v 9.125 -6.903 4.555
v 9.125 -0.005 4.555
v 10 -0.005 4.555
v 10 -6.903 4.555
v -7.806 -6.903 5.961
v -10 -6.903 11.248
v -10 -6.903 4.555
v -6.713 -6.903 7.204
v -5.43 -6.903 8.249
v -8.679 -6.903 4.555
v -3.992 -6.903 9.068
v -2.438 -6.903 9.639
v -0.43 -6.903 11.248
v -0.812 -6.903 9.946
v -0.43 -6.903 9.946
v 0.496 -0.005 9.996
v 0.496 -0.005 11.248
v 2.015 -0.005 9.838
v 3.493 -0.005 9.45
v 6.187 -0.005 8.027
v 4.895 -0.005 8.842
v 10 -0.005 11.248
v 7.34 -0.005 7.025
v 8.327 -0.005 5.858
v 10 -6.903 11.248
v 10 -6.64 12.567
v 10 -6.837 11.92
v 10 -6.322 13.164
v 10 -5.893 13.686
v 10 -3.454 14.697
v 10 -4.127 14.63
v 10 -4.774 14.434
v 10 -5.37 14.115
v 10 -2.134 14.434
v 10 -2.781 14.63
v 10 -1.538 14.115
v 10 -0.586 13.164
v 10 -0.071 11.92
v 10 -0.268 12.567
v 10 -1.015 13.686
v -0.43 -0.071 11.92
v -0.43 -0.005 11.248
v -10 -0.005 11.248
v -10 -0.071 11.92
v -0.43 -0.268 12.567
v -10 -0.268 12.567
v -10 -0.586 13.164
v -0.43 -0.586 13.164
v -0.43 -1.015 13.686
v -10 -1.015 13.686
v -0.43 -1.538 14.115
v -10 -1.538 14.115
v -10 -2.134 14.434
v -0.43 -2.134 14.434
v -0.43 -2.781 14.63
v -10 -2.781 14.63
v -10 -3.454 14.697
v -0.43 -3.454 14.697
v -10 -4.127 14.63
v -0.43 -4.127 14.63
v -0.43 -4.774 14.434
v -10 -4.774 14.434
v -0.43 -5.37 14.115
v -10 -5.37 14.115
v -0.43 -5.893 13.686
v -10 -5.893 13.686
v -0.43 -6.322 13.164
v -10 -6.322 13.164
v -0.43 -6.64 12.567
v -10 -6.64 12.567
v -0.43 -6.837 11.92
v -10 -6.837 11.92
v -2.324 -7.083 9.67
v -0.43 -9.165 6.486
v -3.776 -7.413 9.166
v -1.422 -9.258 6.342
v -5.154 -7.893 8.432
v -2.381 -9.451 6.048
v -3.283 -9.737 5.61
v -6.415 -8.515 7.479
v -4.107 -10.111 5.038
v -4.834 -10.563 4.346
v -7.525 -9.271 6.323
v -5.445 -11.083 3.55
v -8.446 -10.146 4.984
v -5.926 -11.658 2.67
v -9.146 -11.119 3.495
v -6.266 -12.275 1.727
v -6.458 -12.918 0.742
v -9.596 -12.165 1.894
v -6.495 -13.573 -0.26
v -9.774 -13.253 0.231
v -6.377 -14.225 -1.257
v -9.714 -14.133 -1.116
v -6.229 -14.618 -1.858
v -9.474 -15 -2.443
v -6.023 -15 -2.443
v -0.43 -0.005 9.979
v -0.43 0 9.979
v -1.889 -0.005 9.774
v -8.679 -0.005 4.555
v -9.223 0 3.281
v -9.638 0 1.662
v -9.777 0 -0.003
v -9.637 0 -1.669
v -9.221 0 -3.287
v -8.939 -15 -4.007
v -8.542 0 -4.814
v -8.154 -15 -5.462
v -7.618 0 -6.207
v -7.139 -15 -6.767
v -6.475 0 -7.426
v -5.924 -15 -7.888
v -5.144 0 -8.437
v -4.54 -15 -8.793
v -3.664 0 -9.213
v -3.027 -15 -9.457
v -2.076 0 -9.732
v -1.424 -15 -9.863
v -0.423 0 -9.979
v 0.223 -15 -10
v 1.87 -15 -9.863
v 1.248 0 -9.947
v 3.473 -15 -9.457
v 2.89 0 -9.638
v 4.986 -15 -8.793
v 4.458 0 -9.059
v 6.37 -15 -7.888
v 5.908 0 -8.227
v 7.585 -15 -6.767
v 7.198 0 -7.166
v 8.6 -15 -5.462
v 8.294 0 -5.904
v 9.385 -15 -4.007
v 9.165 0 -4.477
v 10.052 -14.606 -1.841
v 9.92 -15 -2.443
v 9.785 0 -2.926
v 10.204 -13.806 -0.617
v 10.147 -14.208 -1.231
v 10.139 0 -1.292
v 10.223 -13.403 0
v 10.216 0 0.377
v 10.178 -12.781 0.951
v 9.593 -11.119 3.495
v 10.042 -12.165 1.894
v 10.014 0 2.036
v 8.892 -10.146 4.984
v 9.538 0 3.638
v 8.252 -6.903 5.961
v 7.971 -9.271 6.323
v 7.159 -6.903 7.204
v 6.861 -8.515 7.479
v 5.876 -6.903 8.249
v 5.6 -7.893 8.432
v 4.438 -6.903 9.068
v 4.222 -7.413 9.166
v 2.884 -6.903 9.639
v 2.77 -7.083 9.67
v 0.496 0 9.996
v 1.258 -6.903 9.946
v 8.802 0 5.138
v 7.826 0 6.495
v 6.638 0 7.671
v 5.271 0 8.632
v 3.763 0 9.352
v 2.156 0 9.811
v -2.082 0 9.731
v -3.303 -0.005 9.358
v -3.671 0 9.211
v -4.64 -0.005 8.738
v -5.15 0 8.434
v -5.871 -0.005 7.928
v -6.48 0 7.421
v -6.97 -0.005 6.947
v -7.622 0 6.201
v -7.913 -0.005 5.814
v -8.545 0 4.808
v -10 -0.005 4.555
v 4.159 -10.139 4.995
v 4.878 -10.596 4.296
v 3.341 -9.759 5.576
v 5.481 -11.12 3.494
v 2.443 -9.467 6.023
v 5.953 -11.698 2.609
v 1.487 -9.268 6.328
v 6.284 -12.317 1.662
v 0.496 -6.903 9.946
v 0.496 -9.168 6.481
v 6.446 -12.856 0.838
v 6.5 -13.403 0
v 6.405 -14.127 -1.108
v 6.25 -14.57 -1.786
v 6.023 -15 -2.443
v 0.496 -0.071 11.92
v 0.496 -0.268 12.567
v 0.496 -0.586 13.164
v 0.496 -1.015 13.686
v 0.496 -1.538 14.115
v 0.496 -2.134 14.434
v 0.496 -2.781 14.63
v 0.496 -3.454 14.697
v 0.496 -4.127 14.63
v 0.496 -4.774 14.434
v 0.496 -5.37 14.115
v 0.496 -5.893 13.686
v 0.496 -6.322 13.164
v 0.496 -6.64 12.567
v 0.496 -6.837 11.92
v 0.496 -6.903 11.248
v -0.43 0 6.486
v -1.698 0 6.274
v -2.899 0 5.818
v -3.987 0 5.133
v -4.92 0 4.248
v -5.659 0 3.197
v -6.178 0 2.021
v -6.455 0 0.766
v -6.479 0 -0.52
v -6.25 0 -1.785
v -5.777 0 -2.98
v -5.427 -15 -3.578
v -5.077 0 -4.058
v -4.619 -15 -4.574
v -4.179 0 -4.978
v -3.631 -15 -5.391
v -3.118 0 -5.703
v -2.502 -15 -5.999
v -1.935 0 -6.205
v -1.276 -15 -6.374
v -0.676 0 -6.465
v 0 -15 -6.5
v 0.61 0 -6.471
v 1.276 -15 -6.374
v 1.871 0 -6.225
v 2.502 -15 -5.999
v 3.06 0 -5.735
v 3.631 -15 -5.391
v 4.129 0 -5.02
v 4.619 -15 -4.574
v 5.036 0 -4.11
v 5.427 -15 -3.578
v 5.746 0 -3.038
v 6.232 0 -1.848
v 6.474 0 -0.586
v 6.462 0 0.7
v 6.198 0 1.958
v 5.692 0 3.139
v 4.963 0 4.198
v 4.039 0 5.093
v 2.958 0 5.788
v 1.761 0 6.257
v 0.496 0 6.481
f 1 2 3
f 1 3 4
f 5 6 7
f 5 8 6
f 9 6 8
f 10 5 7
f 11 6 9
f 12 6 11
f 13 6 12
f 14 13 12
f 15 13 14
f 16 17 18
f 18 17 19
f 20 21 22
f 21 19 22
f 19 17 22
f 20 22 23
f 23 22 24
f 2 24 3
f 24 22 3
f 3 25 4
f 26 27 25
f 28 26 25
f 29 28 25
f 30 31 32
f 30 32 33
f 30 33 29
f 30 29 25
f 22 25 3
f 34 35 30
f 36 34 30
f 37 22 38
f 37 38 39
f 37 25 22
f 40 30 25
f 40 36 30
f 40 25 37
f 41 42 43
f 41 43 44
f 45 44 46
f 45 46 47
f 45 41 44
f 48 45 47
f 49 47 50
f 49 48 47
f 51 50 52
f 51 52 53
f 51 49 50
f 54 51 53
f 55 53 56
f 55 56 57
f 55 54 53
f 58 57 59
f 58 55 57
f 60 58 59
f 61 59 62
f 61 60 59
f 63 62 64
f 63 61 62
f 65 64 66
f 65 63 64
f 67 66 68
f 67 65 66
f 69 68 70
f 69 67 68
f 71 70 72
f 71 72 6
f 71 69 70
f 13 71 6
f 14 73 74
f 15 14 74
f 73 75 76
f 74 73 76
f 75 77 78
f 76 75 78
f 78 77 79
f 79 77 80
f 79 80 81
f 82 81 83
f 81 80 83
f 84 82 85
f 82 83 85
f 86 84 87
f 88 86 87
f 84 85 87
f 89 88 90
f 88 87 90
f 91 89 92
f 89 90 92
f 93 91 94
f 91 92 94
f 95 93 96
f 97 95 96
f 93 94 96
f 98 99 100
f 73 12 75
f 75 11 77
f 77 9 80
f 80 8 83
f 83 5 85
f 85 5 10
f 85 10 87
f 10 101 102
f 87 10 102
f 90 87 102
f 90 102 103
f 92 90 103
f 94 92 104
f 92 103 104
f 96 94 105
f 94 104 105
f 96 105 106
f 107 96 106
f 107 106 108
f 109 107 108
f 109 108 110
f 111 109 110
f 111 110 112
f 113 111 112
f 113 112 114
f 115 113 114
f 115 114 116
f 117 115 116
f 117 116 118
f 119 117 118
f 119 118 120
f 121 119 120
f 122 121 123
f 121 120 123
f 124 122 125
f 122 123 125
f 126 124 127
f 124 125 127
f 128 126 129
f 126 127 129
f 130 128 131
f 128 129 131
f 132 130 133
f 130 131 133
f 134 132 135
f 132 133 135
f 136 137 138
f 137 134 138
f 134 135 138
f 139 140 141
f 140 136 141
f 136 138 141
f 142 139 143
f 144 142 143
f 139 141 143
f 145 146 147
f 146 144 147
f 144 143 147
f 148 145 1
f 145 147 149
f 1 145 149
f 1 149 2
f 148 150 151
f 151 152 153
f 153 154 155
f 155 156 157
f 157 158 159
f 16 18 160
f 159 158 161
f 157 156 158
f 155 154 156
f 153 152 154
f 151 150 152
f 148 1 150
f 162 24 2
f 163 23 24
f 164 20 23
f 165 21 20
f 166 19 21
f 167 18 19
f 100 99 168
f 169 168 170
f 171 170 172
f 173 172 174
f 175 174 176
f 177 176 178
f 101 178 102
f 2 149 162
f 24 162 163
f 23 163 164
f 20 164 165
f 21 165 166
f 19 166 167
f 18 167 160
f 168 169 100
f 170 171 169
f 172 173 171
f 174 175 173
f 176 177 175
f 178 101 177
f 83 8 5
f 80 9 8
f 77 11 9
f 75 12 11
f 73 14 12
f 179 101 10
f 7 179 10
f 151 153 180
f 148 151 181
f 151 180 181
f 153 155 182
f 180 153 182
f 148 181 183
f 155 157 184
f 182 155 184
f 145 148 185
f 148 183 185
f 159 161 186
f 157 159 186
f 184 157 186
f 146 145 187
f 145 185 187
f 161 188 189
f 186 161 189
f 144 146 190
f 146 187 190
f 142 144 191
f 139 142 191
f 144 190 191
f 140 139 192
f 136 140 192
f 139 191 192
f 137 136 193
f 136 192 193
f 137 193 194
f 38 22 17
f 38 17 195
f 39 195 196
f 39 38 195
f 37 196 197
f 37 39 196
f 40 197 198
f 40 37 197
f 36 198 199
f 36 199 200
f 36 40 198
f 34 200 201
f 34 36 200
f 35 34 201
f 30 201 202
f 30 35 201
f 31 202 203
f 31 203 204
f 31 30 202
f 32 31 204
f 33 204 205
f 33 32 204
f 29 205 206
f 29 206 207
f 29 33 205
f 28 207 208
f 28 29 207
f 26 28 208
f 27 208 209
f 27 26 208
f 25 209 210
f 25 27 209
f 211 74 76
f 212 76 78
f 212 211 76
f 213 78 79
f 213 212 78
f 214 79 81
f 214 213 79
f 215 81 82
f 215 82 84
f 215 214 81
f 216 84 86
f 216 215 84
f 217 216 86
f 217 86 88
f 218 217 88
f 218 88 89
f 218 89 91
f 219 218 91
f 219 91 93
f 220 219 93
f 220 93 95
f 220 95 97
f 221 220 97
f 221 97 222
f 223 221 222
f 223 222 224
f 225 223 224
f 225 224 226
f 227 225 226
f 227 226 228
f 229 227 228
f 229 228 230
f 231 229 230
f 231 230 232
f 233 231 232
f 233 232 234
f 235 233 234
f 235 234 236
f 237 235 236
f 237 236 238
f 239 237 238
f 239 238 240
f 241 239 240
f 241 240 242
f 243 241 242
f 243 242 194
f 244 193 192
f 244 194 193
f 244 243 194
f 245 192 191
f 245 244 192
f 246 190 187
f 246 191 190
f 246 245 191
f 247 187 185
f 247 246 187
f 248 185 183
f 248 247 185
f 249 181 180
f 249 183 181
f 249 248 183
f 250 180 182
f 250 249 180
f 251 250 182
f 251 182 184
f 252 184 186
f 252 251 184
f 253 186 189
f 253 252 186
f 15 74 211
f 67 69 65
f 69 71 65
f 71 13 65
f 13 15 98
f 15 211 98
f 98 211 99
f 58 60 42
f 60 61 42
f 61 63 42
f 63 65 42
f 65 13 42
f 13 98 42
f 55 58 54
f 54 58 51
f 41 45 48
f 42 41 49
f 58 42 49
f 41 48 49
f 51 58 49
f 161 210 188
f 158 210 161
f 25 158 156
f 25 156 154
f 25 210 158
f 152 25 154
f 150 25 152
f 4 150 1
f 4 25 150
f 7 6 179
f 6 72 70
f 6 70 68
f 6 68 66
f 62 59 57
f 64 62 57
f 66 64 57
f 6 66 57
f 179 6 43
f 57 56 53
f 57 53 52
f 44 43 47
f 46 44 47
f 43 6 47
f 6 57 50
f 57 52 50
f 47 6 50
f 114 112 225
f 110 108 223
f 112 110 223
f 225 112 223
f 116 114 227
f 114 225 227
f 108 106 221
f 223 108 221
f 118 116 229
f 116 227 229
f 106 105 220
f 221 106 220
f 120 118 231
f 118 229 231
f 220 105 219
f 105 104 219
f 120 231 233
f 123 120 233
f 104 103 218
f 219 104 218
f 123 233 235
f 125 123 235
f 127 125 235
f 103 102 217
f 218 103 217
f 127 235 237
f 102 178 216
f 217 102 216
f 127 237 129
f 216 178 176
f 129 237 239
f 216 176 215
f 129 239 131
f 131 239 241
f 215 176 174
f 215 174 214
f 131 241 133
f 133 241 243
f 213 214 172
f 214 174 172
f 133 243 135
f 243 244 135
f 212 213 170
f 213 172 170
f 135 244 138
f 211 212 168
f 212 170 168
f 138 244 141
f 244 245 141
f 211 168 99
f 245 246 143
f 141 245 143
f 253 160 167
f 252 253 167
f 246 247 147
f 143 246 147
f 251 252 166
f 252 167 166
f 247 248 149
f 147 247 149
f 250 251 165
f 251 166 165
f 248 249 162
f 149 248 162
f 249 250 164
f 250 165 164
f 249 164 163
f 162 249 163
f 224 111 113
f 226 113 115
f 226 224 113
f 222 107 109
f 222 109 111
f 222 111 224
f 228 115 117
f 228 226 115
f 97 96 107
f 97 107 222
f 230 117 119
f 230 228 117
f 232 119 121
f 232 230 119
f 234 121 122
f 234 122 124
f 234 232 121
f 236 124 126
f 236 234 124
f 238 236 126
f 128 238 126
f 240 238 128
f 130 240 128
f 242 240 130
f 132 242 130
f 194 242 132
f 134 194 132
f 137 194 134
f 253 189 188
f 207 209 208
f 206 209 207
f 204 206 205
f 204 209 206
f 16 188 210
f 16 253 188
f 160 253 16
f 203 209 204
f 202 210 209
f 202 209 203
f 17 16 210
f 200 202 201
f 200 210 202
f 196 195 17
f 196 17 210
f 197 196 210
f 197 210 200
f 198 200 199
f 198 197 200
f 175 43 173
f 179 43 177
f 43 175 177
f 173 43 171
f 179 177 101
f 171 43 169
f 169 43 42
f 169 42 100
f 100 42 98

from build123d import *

# Parameters (mm, degrees)
SKETCH_R             = 10
SKETCH_R_2           = 6.5
PAD_DEPTH            = 15
POCKET_DEPTH         = 15
POCKET_DEPTH_BACK    = -15
PAD001_DEPTH         = 10
PAD001_DEPTH_BACK    = 10
SKETCH003_W          = 0.925108
SKETCH003_H          = 21.969815
POCKET001_DEPTH      = 15
POCKET001_DEPTH_BACK = -15
SKETCH004_R          = 6.5
POCKET002_DEPTH      = 15
POCKET002_DEPTH_BACK = -15


with BuildPart() as part:
    # Sketch (on XZ_Plane of Origin) → Pad (new body)
    with BuildSketch(Plane.XZ):
        with Locations((0.223041, 0)):
            Circle(SKETCH_R)
        Circle(SKETCH_R_2, mode=Mode.SUBTRACT)
    extrude(amount=PAD_DEPTH)

    # Sketch001 (on YZ_Plane of Origin) → Pocket (cut, two sides)
    with BuildSketch(Plane.YZ) as pocket_sk:
        Polygon((-5.152612, 12.624485), (-17.571489, -6.377891), (-30.254476, 15.01538), (-10.204725, 21.22482), align=None)
    extrude(amount=-POCKET_DEPTH, mode=Mode.SUBTRACT)
    extrude(pocket_sk.sketch, amount=-POCKET_DEPTH_BACK, mode=Mode.SUBTRACT)

    # Sketch002 (on YZ_Plane of Origin) → Pad001 (join, two sides)
    with BuildSketch(Plane.YZ) as pad001_sk:
        with BuildLine():
            ThreePointArc((-0.00519, 11.247658), (-3.454061, 14.696529), (-6.902933, 11.247658))
            Line((-6.902933, 11.247658), (-6.902933, 4.5552))
            Line((-0.00519, 4.5552), (-6.902933, 4.5552))
            Line((-0.00519, 11.247658), (-0.00519, 4.5552))
        make_face()
    extrude(amount=PAD001_DEPTH)
    extrude(pad001_sk.sketch, amount=-PAD001_DEPTH_BACK)

    # Sketch003 (on XZ_Plane of Origin) → Pocket001 (cut, two sides)
    with BuildSketch(Plane.XZ) as pocket001_sk:
        with Locations((0.033004, 12.288593)):
            Rectangle(SKETCH003_W, SKETCH003_H)
    extrude(amount=-POCKET001_DEPTH, mode=Mode.SUBTRACT)
    extrude(pocket001_sk.sketch, amount=-POCKET001_DEPTH_BACK, mode=Mode.SUBTRACT)

    # Sketch004 (on XZ_Plane of Origin) → Pocket002 (cut, two sides)
    with BuildSketch(Plane.XZ) as pocket002_sk:
        Circle(SKETCH004_R)
    extrude(amount=-POCKET002_DEPTH, mode=Mode.SUBTRACT)
    extrude(pocket002_sk.sketch, amount=-POCKET002_DEPTH_BACK, mode=Mode.SUBTRACT)


solid = part.part
